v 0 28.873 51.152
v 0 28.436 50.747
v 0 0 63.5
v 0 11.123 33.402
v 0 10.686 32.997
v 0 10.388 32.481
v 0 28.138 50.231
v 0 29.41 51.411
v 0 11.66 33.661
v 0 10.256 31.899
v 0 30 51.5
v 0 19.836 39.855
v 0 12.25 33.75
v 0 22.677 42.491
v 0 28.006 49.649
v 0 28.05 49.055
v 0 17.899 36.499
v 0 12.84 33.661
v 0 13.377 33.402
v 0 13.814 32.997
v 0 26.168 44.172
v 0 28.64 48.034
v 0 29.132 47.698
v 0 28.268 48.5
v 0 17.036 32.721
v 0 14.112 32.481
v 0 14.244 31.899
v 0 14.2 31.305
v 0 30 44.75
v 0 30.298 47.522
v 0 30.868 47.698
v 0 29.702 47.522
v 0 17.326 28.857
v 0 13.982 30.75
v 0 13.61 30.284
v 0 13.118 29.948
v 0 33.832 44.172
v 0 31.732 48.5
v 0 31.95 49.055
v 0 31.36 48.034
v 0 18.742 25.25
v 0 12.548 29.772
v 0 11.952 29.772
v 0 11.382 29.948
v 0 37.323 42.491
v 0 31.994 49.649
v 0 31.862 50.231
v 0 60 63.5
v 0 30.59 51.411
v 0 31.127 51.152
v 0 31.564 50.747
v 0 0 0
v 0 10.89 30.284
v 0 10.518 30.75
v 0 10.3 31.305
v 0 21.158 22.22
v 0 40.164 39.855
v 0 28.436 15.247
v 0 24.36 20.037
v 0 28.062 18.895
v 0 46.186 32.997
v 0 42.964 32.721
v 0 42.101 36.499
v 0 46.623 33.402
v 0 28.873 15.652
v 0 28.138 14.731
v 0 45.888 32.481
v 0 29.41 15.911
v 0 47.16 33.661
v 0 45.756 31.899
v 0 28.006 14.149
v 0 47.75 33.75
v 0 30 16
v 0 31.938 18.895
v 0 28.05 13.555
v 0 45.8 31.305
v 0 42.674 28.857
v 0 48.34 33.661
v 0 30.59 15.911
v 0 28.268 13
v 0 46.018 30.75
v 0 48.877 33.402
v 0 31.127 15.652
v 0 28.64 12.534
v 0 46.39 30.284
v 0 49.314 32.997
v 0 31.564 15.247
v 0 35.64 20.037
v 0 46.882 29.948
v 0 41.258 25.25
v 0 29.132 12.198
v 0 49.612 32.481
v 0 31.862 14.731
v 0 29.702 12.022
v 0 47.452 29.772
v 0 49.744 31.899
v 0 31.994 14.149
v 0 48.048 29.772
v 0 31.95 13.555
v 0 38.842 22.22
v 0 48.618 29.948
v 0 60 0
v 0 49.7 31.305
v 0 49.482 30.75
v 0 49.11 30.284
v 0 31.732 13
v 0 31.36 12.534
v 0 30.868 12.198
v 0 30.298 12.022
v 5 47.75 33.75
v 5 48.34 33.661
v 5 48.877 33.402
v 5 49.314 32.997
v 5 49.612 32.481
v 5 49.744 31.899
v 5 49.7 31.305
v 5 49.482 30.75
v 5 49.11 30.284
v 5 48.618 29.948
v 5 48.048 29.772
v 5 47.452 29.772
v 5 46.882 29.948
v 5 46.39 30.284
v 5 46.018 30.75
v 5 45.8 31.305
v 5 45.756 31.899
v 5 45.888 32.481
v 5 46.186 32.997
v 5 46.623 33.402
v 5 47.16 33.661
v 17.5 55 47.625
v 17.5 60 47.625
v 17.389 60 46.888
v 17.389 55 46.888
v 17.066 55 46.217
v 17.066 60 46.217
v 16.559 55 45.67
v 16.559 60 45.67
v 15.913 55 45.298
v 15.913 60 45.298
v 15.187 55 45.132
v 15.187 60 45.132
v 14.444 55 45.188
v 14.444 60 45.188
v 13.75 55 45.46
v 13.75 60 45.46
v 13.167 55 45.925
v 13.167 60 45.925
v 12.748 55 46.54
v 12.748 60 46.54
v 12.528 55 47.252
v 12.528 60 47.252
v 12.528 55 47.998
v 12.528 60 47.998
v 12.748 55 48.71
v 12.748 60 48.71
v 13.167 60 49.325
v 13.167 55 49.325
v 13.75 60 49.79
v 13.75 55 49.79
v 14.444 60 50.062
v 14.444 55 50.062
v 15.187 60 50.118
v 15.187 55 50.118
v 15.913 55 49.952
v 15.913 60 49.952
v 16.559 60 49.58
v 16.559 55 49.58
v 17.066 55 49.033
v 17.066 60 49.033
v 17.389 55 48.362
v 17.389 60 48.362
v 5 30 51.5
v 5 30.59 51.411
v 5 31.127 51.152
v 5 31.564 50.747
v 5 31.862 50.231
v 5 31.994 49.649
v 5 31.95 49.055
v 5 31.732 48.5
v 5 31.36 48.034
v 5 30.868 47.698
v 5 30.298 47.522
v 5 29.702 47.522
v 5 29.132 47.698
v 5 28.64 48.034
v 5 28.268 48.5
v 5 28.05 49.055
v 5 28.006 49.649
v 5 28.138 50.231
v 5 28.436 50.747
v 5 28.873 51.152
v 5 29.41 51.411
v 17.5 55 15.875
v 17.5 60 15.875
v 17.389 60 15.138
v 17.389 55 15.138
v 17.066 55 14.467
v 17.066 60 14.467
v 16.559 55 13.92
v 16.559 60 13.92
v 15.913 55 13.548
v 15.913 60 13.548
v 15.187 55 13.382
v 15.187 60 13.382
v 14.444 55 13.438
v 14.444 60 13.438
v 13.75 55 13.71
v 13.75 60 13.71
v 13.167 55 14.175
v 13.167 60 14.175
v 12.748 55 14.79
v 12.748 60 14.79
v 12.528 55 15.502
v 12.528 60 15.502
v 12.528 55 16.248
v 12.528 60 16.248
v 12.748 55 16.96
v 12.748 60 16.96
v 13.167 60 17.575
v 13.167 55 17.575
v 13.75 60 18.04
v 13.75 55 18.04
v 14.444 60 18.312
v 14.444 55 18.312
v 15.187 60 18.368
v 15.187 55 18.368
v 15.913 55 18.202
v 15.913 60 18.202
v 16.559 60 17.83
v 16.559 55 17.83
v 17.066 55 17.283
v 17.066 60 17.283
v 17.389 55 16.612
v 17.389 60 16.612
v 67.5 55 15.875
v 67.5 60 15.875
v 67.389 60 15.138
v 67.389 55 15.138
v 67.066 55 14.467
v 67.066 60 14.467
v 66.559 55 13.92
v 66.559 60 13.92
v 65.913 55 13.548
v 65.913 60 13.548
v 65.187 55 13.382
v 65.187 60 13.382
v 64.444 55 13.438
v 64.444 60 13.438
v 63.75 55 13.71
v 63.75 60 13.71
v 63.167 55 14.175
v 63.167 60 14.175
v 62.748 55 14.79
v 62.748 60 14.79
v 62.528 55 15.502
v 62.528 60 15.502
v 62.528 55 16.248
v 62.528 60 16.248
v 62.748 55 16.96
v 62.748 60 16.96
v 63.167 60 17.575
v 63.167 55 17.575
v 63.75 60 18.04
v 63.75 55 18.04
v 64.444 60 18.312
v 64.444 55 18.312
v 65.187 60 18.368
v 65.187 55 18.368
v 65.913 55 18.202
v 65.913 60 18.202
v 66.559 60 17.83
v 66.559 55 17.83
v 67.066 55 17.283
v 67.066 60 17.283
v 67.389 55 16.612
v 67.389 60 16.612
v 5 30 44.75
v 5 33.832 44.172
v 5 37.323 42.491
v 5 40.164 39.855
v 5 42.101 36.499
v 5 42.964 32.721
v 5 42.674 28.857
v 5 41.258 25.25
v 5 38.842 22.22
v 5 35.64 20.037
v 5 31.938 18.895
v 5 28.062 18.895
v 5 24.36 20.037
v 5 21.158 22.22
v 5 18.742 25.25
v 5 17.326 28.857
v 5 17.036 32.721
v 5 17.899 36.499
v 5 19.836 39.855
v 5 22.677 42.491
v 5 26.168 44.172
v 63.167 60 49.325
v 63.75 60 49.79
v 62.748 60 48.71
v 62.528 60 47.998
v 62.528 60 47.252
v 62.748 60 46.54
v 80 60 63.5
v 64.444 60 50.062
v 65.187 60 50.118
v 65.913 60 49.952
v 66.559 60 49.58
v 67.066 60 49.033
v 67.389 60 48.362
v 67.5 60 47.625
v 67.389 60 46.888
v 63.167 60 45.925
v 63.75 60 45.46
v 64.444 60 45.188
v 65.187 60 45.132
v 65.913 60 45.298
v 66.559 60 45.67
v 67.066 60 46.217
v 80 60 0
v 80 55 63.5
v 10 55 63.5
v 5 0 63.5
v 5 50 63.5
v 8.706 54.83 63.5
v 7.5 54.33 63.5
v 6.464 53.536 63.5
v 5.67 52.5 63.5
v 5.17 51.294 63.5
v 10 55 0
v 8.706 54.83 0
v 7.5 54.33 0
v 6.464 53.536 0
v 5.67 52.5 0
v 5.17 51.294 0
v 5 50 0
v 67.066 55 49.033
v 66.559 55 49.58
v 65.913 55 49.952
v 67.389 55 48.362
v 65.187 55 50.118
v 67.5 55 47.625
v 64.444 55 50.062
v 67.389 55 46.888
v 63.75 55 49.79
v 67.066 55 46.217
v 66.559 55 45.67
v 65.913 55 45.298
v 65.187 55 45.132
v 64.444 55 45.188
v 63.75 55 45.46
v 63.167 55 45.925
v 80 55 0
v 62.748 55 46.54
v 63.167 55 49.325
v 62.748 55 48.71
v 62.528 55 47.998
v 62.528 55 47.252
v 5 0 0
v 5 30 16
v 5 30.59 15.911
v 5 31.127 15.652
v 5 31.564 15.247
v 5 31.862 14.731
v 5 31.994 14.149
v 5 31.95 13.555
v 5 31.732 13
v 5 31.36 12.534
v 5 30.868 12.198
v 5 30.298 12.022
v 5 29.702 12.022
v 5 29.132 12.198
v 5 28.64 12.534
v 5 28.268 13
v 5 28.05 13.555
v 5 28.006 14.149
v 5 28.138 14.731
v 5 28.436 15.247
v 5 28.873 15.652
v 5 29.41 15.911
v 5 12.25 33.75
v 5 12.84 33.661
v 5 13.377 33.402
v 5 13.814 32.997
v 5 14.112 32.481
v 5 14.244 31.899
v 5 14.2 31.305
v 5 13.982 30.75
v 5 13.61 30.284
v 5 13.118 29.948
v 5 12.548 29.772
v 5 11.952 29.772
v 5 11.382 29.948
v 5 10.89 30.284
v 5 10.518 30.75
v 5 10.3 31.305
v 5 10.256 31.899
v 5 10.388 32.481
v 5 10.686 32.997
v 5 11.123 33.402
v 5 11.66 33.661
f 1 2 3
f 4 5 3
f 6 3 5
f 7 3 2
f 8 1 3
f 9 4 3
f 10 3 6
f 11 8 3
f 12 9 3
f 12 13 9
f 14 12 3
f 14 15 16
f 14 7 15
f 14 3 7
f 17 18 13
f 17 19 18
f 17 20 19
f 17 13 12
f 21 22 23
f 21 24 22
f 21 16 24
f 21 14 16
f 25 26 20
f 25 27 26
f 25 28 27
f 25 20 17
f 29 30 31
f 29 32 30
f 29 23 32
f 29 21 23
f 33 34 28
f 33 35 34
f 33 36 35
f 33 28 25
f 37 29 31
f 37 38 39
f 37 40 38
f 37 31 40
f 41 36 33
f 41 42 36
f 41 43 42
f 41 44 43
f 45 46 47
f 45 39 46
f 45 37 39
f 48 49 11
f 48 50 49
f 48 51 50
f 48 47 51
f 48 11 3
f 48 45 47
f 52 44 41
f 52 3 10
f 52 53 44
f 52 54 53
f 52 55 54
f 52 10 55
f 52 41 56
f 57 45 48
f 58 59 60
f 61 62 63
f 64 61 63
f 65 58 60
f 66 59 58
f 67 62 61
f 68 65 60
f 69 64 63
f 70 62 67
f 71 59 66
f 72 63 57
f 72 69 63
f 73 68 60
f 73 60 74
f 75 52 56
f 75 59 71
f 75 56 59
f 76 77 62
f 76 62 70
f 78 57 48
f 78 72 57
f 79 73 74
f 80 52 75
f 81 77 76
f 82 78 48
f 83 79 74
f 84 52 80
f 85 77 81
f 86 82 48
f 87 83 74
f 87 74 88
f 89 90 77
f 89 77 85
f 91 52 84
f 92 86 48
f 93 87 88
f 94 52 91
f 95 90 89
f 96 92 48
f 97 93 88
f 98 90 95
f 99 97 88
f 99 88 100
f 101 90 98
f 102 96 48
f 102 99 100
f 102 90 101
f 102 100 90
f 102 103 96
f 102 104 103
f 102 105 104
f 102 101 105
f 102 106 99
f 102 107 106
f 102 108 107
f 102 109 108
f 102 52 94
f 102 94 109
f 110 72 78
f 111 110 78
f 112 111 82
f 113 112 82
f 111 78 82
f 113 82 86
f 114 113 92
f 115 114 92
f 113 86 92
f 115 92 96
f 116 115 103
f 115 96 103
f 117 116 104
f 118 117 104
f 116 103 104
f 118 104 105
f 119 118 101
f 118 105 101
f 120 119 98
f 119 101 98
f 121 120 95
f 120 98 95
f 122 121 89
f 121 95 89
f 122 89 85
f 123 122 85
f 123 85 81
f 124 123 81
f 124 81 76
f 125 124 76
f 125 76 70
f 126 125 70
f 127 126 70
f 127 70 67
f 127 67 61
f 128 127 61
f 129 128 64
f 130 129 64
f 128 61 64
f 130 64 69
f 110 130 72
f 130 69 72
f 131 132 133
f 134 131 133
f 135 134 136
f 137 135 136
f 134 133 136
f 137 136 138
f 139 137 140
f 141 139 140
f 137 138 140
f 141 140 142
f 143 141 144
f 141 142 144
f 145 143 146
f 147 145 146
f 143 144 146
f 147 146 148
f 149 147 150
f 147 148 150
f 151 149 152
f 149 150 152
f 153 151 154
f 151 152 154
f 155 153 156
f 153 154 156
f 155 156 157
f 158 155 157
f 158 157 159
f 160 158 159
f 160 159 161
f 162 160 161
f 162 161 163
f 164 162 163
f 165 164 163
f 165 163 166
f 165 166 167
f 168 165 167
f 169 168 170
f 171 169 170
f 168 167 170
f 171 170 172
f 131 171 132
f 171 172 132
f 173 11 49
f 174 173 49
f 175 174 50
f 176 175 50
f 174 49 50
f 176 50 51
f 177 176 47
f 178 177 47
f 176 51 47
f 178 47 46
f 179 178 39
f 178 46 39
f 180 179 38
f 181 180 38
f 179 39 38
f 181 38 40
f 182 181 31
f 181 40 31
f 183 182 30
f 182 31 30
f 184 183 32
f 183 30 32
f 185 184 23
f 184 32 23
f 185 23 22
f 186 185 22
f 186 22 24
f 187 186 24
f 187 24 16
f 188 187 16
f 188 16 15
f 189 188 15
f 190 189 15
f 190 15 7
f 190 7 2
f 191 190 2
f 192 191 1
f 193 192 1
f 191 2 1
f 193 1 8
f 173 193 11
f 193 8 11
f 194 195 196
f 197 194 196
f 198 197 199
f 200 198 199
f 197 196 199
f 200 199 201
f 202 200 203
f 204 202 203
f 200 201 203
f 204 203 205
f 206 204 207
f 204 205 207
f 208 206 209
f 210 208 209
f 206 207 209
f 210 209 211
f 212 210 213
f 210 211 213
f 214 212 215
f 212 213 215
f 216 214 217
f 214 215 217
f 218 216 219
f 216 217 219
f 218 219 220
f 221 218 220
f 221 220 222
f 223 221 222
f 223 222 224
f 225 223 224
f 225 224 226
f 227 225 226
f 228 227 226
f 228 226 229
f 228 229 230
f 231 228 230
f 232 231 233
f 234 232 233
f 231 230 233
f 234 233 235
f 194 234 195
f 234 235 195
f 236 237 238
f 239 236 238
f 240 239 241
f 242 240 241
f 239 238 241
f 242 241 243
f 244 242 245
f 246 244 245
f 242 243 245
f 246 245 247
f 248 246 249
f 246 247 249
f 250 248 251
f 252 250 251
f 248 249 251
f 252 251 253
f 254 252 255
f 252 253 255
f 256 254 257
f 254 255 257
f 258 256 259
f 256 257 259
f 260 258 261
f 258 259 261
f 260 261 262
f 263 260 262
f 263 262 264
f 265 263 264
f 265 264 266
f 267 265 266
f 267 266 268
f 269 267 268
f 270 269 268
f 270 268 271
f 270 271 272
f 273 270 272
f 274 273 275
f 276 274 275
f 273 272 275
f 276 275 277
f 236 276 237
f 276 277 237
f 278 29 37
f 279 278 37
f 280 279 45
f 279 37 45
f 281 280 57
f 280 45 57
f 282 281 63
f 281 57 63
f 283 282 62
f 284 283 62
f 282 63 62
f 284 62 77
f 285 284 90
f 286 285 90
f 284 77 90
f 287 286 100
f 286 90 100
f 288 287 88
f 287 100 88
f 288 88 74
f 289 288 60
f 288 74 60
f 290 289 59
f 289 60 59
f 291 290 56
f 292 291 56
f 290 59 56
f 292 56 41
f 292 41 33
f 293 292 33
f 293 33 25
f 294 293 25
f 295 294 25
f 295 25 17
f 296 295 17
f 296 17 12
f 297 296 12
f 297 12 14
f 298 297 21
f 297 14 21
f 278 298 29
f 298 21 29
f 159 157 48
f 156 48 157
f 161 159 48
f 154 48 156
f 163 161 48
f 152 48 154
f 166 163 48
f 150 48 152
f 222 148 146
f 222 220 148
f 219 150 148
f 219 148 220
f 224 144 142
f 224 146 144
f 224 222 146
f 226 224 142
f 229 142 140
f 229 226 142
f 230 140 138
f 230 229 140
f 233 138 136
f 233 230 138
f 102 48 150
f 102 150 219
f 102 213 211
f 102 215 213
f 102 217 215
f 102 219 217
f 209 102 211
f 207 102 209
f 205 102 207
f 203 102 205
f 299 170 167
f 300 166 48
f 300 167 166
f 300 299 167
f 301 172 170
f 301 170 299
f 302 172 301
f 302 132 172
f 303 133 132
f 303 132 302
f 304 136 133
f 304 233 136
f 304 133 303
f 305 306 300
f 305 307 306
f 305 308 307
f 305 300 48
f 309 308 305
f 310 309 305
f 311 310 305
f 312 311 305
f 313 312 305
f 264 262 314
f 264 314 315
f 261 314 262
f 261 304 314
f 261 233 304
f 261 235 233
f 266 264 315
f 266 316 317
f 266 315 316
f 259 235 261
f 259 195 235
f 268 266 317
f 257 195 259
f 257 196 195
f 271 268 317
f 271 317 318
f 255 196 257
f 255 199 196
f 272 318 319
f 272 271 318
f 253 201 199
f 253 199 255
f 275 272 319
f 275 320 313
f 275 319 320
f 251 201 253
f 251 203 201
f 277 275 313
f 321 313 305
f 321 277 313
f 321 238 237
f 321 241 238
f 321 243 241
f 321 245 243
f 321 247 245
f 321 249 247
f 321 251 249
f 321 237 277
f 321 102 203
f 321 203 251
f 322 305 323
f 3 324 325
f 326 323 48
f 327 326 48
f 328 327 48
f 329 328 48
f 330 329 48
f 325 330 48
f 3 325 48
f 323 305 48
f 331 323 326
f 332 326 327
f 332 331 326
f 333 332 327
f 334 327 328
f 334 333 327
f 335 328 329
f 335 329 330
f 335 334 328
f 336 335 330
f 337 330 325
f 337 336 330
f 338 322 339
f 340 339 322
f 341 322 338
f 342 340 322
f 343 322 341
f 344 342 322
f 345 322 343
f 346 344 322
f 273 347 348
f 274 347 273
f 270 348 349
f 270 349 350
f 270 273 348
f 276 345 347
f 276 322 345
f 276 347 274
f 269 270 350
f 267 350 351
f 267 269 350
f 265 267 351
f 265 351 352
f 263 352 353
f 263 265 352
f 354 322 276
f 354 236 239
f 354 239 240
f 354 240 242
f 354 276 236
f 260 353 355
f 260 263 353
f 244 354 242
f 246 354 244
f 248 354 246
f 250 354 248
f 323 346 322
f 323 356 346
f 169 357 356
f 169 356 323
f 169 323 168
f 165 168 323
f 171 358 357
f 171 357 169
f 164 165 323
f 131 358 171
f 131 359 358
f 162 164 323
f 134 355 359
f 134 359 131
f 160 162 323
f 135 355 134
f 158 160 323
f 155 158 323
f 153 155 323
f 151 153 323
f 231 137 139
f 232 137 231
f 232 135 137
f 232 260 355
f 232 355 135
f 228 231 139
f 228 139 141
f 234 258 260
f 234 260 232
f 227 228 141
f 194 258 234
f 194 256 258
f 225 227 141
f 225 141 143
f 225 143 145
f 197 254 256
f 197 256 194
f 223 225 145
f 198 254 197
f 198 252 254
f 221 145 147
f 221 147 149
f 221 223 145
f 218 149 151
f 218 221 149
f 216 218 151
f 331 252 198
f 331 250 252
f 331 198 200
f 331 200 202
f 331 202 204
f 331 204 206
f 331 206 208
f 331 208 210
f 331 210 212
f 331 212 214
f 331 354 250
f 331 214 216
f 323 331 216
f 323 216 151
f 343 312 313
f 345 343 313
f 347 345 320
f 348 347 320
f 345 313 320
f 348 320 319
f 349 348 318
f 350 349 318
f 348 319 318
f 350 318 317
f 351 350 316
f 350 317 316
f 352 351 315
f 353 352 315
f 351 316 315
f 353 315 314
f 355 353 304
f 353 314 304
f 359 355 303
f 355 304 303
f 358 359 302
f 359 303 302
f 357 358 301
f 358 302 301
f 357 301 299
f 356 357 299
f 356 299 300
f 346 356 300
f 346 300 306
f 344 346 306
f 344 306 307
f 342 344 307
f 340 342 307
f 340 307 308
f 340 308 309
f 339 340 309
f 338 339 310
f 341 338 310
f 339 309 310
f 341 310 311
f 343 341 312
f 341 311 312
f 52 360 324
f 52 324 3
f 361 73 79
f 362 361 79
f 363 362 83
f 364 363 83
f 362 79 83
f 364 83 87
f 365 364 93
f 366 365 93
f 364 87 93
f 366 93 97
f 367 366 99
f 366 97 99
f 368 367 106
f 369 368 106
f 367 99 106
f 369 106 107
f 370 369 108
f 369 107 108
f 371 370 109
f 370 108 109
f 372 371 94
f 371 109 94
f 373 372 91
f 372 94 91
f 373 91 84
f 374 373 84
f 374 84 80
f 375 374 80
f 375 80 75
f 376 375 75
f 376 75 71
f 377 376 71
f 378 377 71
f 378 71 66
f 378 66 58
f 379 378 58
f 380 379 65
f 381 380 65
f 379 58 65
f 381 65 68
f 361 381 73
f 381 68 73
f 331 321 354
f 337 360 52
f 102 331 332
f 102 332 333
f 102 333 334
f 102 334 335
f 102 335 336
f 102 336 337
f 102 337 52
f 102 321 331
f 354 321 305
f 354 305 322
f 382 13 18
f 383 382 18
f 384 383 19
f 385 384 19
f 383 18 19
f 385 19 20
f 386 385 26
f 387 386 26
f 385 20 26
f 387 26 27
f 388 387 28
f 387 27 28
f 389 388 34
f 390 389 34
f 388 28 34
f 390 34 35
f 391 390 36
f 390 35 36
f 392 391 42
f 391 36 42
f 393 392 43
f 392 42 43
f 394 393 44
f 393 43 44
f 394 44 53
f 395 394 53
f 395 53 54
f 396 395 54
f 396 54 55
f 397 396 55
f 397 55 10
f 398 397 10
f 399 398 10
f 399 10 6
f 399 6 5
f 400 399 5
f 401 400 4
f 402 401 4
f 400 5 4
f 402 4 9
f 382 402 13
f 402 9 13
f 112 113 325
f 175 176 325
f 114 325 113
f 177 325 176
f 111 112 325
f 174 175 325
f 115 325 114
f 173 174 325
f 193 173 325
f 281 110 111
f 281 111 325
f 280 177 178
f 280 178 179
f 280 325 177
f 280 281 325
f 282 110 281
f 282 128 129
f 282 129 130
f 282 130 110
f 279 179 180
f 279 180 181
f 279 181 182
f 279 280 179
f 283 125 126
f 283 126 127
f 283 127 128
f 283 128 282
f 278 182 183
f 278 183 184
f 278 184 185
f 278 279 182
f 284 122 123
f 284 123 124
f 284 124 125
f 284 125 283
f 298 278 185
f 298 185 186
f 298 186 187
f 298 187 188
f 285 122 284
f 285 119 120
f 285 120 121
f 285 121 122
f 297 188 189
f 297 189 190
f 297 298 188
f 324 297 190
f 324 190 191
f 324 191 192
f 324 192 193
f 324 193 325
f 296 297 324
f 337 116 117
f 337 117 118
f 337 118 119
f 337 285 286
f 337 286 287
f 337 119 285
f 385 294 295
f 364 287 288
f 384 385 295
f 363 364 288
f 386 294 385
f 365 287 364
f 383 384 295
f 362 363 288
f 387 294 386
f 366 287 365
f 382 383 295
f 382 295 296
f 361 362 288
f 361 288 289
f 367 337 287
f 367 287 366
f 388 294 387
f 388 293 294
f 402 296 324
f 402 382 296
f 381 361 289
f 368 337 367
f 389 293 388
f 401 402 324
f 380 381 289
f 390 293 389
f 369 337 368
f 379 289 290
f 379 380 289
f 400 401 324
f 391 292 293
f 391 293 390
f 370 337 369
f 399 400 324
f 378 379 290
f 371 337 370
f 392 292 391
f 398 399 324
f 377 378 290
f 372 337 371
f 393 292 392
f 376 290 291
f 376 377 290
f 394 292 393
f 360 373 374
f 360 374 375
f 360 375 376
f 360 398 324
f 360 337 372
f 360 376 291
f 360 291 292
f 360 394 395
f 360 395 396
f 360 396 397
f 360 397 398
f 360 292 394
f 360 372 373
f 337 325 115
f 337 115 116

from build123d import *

# Parameters (mm, degrees)
BOSS_EXTRUDE1_DEPTH = 63.5
SKETCH2_R           = 13
SKETCH2_R_2         = 2
CUT_EXTRUDE1_DEPTH  = 5
SKETCH3_R           = 2.5
CUT_EXTRUDE2_DEPTH  = 5


with BuildPart() as part:
    # Sketch1 → Boss-Extrude1 (new body)
    with BuildSketch(Plane.XY):
        with BuildLine():
            Line((0, 0), (0, 60))
            Line((0, 60), (80, 60))
            Line((80, 60), (80, 55))
            Line((80, 55), (10, 55))
            ThreePointArc((10, 55), (6.464466094, 53.535533906), (5, 50))
            Line((5, 50), (5, 0))
            Line((5, 0), (0, 0))
        make_face()
    extrude(amount=BOSS_EXTRUDE1_DEPTH)

    # Sketch2 → Cut-Extrude1 (cut)
    with BuildSketch(Plane.ZY):
        with Locations((31.75, 30)):
            Circle(SKETCH2_R)
        with Locations((49.5, 30)):
            Circle(SKETCH2_R_2)
        with Locations((31.75, 12.25)):
            Circle(SKETCH2_R_2)
        with Locations((14, 30)):
            Circle(SKETCH2_R_2)
        with Locations((31.75, 47.75)):
            Circle(SKETCH2_R_2)
    extrude(amount=-CUT_EXTRUDE1_DEPTH, mode=Mode.SUBTRACT)

    # Sketch3 → Cut-Extrude2 (cut)
    with BuildSketch(Plane(origin=(0, 60, 0), x_dir=(1, 0, 0), z_dir=(0, 1, 0))):
        with Locations((15, -15.875)):
            Circle(SKETCH3_R)
        with Locations((65, -15.875)):
            Circle(SKETCH3_R)
        with Locations((65, -47.625)):
            Circle(SKETCH3_R)
        with Locations((15, -47.625)):
            Circle(SKETCH3_R)
    extrude(amount=-CUT_EXTRUDE2_DEPTH, mode=Mode.SUBTRACT)


solid = part.part
